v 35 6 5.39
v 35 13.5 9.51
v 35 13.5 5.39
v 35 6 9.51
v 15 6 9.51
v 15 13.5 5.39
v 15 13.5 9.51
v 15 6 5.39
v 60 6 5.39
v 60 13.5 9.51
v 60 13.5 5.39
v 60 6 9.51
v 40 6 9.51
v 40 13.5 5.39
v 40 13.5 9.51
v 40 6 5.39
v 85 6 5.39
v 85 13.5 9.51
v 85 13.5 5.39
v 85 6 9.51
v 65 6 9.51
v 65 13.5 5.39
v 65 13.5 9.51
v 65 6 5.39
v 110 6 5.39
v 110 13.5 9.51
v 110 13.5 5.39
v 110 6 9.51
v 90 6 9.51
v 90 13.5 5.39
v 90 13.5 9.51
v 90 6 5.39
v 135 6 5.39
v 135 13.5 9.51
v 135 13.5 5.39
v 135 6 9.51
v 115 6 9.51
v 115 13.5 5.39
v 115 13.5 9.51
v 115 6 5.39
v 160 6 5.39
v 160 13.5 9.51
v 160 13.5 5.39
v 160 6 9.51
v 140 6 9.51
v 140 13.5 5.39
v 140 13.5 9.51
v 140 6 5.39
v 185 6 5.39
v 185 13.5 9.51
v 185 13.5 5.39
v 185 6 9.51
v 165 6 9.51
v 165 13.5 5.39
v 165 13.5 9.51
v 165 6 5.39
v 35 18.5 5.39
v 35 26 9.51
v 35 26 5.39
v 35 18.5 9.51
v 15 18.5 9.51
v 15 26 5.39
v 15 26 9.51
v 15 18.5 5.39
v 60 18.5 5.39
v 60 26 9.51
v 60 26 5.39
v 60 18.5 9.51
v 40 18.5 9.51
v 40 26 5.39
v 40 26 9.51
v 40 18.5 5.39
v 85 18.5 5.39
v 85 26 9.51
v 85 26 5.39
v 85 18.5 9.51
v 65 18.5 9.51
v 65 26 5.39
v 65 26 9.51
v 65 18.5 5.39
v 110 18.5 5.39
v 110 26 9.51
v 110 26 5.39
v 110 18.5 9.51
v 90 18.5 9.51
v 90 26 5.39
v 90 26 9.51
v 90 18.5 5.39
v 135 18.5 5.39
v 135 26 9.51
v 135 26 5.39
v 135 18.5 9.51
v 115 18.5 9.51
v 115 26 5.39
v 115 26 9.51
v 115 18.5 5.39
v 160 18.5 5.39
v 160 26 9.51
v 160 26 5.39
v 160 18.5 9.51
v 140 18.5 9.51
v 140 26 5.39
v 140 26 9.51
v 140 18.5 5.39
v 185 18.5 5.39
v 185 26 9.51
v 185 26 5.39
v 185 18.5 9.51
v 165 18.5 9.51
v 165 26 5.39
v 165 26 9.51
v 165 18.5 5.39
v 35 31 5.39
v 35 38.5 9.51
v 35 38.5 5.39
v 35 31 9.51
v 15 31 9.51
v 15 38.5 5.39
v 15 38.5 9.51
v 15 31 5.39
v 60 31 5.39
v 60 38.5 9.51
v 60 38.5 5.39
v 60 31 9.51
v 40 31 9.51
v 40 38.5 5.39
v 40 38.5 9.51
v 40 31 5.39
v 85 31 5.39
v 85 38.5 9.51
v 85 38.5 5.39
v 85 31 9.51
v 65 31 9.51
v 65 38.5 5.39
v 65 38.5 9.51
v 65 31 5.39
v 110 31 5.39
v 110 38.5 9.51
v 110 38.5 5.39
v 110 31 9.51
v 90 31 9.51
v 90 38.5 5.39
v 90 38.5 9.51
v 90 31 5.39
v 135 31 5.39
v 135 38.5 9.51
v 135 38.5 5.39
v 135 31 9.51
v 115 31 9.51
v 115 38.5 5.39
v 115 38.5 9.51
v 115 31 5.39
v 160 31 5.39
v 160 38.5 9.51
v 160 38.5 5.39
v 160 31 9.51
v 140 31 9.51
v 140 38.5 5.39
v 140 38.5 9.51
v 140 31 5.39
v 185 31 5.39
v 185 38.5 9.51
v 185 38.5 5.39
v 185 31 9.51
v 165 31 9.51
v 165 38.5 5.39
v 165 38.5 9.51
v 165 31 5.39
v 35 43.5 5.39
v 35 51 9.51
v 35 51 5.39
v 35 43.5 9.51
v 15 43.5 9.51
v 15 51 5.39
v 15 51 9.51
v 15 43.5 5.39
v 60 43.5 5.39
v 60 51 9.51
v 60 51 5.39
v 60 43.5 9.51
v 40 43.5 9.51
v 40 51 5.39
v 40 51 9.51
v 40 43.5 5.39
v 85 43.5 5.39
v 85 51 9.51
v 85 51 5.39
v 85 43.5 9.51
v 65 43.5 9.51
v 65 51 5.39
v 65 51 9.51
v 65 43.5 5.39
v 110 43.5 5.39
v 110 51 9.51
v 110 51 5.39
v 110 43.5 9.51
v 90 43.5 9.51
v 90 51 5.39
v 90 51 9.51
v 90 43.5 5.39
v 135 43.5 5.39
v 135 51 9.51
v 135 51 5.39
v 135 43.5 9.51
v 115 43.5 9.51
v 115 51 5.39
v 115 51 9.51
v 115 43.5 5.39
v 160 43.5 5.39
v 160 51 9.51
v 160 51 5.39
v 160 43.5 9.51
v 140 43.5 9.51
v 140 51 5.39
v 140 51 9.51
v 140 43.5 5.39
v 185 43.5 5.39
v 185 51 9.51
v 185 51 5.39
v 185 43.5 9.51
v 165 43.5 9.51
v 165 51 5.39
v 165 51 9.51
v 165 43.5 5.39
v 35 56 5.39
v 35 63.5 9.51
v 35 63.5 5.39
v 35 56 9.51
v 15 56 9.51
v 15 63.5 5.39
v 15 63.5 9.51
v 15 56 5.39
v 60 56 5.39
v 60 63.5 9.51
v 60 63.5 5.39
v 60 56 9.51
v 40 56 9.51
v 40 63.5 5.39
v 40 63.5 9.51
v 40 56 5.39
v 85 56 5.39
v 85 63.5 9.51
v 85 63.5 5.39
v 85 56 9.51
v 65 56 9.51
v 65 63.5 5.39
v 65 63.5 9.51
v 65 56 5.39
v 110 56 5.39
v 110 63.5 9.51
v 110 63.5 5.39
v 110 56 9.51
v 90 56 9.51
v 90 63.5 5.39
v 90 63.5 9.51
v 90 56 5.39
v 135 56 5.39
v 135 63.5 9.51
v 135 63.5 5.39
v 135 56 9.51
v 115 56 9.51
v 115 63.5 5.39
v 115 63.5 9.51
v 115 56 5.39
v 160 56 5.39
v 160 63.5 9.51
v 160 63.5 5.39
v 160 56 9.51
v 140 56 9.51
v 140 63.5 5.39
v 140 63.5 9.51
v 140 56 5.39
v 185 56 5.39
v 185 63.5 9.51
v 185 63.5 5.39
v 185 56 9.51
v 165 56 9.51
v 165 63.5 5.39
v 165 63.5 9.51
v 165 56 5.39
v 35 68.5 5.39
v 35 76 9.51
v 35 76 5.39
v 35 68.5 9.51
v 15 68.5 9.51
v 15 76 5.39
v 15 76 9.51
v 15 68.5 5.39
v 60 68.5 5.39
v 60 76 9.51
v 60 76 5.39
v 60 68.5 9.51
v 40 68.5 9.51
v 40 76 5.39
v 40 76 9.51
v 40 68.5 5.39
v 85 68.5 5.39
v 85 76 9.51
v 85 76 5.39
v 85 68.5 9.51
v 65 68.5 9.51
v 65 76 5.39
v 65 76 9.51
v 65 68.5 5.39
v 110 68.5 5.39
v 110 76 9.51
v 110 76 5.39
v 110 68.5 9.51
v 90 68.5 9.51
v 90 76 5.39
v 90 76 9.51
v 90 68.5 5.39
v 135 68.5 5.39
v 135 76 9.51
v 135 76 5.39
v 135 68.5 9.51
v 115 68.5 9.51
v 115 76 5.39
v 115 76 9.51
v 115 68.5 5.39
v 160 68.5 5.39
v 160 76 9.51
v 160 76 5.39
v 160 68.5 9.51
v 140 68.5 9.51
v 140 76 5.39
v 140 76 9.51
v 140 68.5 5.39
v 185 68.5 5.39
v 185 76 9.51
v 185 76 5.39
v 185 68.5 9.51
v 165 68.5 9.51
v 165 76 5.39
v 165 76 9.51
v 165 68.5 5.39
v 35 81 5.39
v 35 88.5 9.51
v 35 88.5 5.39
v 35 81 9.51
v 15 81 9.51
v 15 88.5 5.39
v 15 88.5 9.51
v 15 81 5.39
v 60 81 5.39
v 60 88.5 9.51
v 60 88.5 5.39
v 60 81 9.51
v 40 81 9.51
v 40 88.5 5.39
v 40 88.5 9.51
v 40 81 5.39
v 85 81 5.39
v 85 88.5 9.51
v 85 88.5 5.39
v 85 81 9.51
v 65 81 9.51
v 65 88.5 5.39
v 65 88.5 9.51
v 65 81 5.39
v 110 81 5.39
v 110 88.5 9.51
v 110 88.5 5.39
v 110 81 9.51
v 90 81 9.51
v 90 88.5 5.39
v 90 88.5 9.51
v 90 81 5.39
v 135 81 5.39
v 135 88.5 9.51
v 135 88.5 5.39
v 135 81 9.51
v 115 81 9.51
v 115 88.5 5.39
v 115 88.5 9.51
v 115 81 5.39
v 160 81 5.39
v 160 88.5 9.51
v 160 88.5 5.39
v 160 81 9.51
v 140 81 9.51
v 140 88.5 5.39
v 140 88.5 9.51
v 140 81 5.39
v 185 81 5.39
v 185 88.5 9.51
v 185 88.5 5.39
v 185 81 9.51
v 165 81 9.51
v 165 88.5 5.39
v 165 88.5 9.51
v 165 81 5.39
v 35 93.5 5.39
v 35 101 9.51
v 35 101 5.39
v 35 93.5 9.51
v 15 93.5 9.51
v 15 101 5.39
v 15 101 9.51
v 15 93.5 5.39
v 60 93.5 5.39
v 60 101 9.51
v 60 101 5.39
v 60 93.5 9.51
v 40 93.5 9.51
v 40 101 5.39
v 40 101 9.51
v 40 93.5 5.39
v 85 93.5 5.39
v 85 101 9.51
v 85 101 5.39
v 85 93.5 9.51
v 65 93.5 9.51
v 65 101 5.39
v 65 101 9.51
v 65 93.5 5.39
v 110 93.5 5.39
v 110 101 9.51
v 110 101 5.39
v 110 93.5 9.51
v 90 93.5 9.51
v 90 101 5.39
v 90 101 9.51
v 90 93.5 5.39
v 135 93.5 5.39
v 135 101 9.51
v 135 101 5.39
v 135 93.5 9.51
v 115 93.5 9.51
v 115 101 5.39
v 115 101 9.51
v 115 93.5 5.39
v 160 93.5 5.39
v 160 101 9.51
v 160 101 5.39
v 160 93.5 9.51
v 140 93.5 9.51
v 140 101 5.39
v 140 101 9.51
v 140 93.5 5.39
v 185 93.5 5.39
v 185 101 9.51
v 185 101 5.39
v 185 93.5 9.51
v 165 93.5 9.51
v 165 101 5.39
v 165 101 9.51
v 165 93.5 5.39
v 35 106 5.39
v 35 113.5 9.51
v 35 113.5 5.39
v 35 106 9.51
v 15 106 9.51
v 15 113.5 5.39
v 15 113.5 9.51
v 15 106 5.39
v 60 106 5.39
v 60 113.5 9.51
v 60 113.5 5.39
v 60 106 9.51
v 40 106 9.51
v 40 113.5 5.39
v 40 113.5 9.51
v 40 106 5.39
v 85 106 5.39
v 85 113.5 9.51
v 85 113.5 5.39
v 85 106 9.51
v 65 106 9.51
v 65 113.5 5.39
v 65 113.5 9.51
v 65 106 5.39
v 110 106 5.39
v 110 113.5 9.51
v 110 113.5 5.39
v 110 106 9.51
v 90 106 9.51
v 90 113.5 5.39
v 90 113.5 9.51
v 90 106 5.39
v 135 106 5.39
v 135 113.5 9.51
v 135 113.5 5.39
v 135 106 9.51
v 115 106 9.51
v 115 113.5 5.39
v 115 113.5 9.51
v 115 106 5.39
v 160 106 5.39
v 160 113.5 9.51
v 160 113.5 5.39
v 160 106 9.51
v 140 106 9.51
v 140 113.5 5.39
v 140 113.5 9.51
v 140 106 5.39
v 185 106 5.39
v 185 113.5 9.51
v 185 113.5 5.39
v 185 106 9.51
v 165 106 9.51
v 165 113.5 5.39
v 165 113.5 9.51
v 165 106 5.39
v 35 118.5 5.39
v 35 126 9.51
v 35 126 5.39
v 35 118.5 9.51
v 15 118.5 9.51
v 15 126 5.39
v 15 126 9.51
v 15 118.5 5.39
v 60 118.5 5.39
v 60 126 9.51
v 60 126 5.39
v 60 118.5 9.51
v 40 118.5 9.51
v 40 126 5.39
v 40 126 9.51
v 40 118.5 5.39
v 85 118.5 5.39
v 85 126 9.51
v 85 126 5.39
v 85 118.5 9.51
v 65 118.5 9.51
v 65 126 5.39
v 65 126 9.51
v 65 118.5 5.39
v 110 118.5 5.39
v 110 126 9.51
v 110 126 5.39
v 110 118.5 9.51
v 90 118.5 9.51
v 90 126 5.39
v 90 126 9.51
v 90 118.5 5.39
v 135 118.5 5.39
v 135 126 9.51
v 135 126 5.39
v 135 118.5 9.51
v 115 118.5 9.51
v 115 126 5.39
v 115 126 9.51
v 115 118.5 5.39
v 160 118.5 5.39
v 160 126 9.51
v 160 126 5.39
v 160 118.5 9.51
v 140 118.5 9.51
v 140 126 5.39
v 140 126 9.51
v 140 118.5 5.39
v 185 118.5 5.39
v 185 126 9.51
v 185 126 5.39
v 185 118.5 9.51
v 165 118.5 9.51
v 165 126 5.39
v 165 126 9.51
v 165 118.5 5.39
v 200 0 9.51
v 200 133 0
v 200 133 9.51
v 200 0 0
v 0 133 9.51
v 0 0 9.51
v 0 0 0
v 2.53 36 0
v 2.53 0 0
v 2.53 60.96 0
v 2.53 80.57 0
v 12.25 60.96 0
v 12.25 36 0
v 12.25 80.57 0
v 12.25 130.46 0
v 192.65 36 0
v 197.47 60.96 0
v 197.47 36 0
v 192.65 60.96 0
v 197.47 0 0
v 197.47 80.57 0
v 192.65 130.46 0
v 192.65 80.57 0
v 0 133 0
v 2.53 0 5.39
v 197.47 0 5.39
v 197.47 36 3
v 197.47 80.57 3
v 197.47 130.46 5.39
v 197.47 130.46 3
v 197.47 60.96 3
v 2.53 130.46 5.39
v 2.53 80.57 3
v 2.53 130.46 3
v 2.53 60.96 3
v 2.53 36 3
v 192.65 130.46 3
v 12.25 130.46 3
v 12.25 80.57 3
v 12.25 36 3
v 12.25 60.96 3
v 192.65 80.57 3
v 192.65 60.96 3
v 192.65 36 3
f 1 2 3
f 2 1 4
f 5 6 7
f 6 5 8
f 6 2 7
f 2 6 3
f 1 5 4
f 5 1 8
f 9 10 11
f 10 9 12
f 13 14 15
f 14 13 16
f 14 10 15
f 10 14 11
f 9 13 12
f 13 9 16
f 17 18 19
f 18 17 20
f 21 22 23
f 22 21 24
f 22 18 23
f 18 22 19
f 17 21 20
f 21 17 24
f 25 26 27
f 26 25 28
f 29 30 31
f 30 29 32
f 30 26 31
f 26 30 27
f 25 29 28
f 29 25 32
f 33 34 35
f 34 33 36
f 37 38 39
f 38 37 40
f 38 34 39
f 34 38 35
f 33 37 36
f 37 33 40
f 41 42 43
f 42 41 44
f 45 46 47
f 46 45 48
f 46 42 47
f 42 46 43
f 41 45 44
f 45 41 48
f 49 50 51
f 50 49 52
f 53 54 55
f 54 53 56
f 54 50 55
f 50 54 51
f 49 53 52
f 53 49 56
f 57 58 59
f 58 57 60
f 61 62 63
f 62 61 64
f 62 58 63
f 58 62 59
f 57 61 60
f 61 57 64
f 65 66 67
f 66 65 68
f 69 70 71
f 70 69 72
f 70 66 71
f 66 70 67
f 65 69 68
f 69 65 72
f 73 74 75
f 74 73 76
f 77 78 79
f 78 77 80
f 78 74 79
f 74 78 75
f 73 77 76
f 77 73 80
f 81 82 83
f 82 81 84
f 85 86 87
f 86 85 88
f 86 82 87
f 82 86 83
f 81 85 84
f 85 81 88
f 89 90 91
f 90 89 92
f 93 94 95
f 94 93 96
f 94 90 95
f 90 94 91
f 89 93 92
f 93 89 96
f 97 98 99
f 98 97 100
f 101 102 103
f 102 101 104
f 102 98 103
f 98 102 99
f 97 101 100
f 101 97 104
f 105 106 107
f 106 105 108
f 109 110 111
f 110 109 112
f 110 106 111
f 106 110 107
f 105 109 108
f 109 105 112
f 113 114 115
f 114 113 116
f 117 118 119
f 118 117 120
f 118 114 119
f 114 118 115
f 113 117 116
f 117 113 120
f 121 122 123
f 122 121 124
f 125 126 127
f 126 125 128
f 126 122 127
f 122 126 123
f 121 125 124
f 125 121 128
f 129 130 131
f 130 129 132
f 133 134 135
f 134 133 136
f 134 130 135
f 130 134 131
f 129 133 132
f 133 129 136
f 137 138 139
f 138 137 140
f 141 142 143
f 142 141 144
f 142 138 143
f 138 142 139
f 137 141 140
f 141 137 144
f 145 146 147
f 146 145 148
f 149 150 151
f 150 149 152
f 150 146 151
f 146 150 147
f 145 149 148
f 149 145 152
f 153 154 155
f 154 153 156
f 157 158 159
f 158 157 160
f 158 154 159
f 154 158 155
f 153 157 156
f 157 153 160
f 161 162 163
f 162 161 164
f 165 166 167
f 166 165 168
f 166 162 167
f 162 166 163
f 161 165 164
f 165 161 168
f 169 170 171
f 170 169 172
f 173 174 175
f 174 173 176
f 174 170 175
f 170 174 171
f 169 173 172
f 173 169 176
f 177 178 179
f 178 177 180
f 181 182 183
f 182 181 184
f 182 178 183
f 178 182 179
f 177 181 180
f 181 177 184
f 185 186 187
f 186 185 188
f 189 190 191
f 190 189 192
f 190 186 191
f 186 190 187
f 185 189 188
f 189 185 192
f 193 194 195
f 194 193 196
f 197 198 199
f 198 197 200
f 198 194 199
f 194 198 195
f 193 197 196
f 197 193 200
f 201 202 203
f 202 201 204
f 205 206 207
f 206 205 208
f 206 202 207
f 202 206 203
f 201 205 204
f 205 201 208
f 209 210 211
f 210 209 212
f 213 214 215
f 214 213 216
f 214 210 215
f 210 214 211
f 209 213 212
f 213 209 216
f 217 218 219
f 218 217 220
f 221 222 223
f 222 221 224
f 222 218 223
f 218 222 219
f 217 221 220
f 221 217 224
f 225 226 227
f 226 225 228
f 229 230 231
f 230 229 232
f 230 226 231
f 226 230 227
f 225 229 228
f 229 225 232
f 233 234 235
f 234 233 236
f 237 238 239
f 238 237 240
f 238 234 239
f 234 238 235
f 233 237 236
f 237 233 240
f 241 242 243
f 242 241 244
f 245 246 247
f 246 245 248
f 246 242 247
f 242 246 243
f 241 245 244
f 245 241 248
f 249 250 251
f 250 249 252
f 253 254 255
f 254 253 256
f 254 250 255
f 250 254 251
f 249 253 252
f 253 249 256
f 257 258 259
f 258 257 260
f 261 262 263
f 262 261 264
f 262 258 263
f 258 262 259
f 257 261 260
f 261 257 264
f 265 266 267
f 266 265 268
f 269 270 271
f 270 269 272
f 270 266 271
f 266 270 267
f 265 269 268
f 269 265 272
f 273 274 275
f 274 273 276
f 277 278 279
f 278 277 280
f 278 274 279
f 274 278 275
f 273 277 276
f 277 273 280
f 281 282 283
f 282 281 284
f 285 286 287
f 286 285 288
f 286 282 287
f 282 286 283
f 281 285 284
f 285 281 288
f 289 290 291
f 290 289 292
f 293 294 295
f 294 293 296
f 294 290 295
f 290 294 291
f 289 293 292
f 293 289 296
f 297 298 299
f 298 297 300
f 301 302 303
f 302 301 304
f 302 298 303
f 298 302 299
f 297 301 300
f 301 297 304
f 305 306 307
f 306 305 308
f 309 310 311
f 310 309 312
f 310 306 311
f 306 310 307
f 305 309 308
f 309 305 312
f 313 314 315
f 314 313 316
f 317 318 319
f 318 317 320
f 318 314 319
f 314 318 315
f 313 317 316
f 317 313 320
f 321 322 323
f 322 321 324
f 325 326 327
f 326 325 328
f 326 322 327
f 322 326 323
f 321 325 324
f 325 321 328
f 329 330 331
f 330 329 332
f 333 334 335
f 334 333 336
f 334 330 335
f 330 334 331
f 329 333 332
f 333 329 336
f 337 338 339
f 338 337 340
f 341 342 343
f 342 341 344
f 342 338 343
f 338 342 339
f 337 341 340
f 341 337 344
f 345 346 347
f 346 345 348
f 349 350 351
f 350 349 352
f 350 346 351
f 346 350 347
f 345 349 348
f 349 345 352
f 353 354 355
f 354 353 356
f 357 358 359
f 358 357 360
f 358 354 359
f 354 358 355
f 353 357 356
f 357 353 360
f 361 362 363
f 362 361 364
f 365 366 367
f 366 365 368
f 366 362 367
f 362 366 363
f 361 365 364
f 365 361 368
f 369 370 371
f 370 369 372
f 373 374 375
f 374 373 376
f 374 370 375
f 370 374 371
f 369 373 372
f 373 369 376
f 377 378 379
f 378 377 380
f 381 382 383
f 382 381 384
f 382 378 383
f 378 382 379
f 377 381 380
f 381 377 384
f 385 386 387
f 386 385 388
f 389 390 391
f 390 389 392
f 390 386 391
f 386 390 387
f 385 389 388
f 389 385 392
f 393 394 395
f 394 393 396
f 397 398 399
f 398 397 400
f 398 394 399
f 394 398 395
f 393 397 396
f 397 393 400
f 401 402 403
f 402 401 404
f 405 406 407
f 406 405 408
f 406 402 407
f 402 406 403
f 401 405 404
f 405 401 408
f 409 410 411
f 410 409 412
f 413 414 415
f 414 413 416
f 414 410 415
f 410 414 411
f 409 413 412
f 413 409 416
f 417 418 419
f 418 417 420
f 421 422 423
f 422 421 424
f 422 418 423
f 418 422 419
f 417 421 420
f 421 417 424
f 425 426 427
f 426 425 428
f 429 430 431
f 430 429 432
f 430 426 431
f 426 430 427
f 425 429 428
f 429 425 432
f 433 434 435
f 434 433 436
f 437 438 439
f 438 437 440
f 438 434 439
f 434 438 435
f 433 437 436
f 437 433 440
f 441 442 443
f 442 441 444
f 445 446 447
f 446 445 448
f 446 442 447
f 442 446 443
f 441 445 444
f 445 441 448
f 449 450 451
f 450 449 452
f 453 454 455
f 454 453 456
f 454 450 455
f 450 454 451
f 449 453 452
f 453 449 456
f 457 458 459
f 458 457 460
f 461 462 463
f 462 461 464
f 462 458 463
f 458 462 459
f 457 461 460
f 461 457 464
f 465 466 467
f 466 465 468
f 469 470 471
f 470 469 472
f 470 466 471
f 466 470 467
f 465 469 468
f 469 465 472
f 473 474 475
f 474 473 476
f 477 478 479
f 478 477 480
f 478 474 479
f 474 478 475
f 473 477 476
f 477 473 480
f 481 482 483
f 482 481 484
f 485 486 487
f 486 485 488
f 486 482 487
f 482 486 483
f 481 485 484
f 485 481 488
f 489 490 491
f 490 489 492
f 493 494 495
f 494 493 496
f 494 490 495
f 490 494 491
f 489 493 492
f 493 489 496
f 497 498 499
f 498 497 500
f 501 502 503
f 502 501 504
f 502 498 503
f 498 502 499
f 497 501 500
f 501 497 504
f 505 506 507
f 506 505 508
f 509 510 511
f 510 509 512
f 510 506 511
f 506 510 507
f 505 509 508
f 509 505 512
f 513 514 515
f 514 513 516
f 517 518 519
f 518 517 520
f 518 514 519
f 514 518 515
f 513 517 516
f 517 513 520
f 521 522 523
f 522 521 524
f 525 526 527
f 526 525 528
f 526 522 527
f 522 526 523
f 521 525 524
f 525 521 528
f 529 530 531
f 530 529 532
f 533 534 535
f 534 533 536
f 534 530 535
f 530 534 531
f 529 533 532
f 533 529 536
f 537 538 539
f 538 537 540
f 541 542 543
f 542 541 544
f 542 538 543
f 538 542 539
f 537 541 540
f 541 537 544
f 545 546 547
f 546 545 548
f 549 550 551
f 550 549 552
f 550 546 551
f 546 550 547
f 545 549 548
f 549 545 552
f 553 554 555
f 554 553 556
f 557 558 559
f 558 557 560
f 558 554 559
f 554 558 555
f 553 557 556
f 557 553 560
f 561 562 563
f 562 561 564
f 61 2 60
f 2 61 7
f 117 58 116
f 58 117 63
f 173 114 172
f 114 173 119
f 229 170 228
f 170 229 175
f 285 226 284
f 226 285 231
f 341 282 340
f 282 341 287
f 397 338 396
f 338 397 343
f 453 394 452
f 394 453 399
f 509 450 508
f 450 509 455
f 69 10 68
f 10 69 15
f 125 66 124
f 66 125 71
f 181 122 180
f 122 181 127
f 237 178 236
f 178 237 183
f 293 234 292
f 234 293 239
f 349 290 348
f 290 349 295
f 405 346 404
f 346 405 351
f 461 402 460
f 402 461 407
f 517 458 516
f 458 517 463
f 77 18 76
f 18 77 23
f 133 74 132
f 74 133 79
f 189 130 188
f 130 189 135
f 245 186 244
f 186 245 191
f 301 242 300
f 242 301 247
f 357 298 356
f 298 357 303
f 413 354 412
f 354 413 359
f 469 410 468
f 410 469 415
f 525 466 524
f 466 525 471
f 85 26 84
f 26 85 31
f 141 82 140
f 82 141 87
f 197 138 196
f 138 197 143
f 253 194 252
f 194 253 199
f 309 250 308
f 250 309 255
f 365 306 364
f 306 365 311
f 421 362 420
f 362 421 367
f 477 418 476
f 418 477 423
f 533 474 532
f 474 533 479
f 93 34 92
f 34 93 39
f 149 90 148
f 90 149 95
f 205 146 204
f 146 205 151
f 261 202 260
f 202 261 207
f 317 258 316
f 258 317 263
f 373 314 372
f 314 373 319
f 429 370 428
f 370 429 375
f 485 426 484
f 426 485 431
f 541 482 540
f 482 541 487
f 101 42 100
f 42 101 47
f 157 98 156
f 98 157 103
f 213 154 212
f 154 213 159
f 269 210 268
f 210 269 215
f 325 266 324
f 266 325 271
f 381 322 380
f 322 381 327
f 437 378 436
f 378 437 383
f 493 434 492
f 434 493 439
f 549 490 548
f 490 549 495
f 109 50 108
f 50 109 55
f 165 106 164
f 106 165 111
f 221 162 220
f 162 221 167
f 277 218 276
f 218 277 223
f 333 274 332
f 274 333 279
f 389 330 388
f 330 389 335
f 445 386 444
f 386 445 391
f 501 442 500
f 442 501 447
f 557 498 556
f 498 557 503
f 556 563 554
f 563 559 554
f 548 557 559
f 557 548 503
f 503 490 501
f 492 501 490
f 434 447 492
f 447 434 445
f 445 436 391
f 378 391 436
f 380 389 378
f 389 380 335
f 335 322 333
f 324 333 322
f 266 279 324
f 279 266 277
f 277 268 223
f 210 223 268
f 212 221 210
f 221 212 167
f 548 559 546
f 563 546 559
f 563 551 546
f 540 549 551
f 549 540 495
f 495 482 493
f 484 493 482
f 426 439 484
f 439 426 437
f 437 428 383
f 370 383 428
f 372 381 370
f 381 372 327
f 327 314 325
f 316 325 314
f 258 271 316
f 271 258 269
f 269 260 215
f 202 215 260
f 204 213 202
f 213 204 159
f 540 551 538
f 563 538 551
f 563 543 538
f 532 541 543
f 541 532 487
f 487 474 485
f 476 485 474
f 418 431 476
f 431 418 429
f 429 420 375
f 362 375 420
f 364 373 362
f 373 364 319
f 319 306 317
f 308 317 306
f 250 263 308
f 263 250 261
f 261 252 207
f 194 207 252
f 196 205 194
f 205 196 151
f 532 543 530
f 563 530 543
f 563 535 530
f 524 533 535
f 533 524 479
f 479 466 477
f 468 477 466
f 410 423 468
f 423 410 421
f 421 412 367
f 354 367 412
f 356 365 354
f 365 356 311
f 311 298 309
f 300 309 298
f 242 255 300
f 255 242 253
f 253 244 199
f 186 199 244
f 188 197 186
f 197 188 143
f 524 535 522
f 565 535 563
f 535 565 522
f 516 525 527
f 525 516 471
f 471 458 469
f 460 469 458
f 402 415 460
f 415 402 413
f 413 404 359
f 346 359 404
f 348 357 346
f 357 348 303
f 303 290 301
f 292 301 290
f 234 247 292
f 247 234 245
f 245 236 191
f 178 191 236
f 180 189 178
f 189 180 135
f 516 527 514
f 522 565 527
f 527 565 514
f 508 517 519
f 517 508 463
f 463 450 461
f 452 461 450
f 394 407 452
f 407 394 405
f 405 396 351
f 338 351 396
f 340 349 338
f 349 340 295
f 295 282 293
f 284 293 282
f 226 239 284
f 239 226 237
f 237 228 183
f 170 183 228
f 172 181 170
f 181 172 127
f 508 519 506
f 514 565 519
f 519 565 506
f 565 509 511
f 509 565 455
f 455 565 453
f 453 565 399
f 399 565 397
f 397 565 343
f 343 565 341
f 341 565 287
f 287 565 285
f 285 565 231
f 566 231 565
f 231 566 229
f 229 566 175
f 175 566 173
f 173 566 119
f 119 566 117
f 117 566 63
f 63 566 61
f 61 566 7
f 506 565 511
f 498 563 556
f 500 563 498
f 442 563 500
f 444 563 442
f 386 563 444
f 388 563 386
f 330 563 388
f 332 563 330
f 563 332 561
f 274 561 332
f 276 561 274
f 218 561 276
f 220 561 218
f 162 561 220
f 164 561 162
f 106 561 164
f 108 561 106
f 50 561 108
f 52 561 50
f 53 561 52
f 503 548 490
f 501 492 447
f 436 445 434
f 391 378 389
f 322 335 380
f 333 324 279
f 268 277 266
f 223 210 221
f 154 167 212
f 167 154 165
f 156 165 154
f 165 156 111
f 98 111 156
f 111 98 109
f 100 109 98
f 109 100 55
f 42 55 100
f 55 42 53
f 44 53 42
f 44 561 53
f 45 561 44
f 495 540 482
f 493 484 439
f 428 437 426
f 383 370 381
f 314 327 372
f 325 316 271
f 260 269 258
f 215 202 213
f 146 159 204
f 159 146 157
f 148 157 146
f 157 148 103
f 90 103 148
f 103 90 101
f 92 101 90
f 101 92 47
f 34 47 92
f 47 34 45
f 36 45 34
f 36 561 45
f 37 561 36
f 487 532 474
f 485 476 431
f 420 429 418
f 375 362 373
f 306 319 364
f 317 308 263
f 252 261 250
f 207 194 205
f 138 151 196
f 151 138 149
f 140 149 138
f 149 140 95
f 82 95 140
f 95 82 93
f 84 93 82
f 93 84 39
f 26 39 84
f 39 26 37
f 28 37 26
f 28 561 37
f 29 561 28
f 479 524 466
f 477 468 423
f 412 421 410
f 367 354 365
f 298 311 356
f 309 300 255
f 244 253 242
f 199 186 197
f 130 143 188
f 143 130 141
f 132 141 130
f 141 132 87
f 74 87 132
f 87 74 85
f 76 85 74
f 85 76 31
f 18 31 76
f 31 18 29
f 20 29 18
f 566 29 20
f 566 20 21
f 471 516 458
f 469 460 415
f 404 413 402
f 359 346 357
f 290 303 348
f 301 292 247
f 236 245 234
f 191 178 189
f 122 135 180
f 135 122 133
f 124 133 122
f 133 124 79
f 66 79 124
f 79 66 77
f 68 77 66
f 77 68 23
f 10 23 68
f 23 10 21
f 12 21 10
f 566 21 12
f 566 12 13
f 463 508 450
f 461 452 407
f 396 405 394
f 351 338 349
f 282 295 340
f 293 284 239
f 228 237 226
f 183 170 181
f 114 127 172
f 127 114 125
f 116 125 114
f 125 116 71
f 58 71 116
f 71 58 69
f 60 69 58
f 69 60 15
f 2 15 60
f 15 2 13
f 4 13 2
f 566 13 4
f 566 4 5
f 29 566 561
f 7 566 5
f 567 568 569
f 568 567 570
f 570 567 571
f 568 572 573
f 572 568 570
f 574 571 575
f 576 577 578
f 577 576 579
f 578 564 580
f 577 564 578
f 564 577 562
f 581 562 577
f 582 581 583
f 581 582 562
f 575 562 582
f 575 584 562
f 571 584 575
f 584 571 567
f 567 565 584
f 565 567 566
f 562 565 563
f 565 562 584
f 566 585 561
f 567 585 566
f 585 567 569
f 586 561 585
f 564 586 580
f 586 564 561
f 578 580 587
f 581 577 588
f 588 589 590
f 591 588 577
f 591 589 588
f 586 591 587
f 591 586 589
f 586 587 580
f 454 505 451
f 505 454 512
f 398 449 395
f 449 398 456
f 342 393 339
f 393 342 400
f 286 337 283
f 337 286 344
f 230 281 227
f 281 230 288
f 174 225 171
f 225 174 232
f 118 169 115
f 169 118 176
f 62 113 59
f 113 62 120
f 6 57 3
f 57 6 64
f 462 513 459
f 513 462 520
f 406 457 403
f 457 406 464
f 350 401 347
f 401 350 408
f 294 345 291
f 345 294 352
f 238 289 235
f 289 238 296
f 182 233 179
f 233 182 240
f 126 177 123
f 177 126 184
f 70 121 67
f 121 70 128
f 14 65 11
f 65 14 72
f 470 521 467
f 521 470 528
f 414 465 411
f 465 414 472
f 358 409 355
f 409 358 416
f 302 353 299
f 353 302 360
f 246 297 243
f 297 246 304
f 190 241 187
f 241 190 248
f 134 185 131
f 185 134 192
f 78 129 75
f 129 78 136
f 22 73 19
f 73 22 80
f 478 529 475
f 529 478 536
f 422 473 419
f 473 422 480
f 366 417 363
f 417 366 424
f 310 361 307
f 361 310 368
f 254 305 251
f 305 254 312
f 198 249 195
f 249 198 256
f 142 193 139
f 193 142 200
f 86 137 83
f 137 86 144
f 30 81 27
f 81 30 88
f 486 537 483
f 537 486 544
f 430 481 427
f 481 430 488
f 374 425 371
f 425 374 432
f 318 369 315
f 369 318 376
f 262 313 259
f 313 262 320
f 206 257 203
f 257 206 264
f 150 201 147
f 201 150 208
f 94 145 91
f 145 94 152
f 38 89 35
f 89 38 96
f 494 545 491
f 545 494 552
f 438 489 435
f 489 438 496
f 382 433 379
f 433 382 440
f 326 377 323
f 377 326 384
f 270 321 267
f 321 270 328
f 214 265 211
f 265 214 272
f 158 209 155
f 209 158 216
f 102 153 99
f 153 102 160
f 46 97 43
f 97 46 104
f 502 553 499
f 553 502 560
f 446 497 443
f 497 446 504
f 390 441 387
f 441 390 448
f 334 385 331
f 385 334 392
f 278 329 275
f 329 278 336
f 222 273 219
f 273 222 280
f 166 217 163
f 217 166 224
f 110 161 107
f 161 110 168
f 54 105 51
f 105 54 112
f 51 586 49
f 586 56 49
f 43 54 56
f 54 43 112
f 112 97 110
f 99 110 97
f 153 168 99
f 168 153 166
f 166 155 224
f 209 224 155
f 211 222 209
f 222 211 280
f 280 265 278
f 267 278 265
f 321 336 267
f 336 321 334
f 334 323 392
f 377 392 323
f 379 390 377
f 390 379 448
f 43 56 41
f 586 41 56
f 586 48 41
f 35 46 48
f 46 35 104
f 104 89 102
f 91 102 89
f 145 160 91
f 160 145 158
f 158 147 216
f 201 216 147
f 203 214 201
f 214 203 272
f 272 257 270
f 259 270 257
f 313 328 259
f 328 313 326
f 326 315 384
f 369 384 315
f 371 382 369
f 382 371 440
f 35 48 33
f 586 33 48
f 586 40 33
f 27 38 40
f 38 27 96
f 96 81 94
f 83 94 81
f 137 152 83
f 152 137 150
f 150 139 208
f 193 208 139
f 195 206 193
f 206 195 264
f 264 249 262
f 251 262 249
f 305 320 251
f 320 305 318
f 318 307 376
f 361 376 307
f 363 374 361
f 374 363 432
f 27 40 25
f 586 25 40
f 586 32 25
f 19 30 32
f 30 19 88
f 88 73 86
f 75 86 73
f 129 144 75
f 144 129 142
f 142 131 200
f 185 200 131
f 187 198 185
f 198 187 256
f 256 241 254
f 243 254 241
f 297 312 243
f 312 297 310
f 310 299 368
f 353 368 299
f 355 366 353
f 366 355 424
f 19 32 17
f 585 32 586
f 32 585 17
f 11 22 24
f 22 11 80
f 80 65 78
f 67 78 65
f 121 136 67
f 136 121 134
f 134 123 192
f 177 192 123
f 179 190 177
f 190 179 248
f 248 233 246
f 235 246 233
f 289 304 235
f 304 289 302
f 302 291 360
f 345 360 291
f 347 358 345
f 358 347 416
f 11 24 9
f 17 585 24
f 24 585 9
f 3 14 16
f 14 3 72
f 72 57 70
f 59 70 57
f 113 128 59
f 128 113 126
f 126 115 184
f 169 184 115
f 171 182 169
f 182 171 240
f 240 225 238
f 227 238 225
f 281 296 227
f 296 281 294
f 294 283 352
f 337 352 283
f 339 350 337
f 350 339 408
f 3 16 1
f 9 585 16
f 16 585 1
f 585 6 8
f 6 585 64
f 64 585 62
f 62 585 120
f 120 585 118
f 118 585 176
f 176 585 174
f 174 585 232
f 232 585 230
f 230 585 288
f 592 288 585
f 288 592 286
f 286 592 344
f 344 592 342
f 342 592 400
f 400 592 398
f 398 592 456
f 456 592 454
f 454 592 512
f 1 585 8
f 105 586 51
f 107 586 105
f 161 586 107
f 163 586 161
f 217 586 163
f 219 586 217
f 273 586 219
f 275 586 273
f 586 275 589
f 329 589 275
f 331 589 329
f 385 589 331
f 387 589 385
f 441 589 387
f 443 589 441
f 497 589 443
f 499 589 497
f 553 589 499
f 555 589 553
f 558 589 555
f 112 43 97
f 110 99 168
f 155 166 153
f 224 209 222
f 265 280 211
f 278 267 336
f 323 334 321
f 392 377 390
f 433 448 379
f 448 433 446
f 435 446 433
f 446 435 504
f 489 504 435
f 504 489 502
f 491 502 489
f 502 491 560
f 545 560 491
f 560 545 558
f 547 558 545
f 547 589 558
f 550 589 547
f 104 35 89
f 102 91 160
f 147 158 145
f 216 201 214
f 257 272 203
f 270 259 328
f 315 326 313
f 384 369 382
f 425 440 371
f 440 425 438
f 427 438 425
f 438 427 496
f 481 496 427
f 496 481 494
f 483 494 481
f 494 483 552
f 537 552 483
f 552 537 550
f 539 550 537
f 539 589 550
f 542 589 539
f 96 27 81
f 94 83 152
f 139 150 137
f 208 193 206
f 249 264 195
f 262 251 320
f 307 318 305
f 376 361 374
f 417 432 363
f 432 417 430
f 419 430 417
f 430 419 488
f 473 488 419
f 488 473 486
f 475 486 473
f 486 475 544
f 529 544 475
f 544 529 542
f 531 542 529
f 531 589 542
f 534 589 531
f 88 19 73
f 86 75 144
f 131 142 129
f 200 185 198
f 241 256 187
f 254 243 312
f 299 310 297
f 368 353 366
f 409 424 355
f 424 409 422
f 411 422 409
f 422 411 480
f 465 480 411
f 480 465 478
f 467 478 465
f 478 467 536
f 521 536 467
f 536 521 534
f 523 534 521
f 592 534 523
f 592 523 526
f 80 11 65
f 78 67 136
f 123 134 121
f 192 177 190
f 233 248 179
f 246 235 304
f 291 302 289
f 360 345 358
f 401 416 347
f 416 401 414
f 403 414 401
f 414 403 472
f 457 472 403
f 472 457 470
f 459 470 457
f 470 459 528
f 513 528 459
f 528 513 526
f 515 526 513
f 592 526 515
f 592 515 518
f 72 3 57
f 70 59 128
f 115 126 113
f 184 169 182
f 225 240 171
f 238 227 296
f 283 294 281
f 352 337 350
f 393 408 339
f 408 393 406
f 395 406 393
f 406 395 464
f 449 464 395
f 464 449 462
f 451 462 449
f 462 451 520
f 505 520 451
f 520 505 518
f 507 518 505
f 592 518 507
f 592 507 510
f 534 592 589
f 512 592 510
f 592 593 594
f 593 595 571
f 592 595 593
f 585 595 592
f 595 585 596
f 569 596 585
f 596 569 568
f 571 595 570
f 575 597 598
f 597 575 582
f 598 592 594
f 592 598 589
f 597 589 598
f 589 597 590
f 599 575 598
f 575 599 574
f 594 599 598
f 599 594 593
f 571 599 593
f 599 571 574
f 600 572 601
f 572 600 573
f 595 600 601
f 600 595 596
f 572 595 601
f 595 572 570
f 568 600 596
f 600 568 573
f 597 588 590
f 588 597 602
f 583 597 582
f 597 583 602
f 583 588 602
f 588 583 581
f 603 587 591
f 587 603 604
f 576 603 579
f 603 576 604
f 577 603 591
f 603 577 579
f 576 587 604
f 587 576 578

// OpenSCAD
// file: ../Parameters.scad
backplateWidth = 280;
backplateHeight = 750;
backplateThickness = 1.35;
// file: utils/MakeVentGrill.scad
module makeVentGrill(width, height) {
    cutoutSize = [20, 7.50];
    spacing = 5;
    for(y = [0:height - 1]) {
        for(x = [0:width - 1]) {
            translate([
                x * (cutoutSize[0] + spacing),
                y * (cutoutSize[1] + spacing),
                0
            ])
            cube([cutoutSize[0], cutoutSize[1], 1]);
        }
    }
}

makeVentGrill(5, 5);
// main file
use <utils/MakeVentGrill.scad>;
include <../Parameters.scad>;

thickness = 8.16 + backplateThickness;
ventWidth = 200;
ventHeight = 133;
borderThickness = 2.53;

function airInletVentBoundingBox() =
    [ventWidth, ventHeight, thickness];

module airInletVent() {

    difference () {
        difference() {
            cube(airInletVentBoundingBox());
            translate([15, 6, -0.05]) scale([1, 1, thickness + 0.1]) makeVentGrill(7, 10);
        }
        pushIn();
    }
    cups();
    
    module pushIn() {
        thickness = 5.40;
        translate([borderThickness, -0.01, -0.01])
            cube([ventWidth - (borderThickness * 2), ventHeight - borderThickness, thickness]);
    }

    module cups() {
        thickness = 3;
        module left() {
            firstHeight = 49.90;
            secondHeight = 24.96;
            width = 12.25;
            translate([0, ventHeight - firstHeight - borderThickness]) 
            cube([width, firstHeight, thickness]);

            translate([0, 36, 0]) 
            cube([width, secondHeight, thickness]);
        }

        module right() {
            firstHeight = 49.90;
            secondHeight = 24.96;
            width = 7.35;
            translate([ventWidth - width, ventHeight - firstHeight - borderThickness]) 
            cube([width, firstHeight, thickness]);

            translate([ventWidth - width, 36, 0]) 
            cube([width, secondHeight, thickness]);
        }

        left();
        right();
    }
}

airInletVent();
